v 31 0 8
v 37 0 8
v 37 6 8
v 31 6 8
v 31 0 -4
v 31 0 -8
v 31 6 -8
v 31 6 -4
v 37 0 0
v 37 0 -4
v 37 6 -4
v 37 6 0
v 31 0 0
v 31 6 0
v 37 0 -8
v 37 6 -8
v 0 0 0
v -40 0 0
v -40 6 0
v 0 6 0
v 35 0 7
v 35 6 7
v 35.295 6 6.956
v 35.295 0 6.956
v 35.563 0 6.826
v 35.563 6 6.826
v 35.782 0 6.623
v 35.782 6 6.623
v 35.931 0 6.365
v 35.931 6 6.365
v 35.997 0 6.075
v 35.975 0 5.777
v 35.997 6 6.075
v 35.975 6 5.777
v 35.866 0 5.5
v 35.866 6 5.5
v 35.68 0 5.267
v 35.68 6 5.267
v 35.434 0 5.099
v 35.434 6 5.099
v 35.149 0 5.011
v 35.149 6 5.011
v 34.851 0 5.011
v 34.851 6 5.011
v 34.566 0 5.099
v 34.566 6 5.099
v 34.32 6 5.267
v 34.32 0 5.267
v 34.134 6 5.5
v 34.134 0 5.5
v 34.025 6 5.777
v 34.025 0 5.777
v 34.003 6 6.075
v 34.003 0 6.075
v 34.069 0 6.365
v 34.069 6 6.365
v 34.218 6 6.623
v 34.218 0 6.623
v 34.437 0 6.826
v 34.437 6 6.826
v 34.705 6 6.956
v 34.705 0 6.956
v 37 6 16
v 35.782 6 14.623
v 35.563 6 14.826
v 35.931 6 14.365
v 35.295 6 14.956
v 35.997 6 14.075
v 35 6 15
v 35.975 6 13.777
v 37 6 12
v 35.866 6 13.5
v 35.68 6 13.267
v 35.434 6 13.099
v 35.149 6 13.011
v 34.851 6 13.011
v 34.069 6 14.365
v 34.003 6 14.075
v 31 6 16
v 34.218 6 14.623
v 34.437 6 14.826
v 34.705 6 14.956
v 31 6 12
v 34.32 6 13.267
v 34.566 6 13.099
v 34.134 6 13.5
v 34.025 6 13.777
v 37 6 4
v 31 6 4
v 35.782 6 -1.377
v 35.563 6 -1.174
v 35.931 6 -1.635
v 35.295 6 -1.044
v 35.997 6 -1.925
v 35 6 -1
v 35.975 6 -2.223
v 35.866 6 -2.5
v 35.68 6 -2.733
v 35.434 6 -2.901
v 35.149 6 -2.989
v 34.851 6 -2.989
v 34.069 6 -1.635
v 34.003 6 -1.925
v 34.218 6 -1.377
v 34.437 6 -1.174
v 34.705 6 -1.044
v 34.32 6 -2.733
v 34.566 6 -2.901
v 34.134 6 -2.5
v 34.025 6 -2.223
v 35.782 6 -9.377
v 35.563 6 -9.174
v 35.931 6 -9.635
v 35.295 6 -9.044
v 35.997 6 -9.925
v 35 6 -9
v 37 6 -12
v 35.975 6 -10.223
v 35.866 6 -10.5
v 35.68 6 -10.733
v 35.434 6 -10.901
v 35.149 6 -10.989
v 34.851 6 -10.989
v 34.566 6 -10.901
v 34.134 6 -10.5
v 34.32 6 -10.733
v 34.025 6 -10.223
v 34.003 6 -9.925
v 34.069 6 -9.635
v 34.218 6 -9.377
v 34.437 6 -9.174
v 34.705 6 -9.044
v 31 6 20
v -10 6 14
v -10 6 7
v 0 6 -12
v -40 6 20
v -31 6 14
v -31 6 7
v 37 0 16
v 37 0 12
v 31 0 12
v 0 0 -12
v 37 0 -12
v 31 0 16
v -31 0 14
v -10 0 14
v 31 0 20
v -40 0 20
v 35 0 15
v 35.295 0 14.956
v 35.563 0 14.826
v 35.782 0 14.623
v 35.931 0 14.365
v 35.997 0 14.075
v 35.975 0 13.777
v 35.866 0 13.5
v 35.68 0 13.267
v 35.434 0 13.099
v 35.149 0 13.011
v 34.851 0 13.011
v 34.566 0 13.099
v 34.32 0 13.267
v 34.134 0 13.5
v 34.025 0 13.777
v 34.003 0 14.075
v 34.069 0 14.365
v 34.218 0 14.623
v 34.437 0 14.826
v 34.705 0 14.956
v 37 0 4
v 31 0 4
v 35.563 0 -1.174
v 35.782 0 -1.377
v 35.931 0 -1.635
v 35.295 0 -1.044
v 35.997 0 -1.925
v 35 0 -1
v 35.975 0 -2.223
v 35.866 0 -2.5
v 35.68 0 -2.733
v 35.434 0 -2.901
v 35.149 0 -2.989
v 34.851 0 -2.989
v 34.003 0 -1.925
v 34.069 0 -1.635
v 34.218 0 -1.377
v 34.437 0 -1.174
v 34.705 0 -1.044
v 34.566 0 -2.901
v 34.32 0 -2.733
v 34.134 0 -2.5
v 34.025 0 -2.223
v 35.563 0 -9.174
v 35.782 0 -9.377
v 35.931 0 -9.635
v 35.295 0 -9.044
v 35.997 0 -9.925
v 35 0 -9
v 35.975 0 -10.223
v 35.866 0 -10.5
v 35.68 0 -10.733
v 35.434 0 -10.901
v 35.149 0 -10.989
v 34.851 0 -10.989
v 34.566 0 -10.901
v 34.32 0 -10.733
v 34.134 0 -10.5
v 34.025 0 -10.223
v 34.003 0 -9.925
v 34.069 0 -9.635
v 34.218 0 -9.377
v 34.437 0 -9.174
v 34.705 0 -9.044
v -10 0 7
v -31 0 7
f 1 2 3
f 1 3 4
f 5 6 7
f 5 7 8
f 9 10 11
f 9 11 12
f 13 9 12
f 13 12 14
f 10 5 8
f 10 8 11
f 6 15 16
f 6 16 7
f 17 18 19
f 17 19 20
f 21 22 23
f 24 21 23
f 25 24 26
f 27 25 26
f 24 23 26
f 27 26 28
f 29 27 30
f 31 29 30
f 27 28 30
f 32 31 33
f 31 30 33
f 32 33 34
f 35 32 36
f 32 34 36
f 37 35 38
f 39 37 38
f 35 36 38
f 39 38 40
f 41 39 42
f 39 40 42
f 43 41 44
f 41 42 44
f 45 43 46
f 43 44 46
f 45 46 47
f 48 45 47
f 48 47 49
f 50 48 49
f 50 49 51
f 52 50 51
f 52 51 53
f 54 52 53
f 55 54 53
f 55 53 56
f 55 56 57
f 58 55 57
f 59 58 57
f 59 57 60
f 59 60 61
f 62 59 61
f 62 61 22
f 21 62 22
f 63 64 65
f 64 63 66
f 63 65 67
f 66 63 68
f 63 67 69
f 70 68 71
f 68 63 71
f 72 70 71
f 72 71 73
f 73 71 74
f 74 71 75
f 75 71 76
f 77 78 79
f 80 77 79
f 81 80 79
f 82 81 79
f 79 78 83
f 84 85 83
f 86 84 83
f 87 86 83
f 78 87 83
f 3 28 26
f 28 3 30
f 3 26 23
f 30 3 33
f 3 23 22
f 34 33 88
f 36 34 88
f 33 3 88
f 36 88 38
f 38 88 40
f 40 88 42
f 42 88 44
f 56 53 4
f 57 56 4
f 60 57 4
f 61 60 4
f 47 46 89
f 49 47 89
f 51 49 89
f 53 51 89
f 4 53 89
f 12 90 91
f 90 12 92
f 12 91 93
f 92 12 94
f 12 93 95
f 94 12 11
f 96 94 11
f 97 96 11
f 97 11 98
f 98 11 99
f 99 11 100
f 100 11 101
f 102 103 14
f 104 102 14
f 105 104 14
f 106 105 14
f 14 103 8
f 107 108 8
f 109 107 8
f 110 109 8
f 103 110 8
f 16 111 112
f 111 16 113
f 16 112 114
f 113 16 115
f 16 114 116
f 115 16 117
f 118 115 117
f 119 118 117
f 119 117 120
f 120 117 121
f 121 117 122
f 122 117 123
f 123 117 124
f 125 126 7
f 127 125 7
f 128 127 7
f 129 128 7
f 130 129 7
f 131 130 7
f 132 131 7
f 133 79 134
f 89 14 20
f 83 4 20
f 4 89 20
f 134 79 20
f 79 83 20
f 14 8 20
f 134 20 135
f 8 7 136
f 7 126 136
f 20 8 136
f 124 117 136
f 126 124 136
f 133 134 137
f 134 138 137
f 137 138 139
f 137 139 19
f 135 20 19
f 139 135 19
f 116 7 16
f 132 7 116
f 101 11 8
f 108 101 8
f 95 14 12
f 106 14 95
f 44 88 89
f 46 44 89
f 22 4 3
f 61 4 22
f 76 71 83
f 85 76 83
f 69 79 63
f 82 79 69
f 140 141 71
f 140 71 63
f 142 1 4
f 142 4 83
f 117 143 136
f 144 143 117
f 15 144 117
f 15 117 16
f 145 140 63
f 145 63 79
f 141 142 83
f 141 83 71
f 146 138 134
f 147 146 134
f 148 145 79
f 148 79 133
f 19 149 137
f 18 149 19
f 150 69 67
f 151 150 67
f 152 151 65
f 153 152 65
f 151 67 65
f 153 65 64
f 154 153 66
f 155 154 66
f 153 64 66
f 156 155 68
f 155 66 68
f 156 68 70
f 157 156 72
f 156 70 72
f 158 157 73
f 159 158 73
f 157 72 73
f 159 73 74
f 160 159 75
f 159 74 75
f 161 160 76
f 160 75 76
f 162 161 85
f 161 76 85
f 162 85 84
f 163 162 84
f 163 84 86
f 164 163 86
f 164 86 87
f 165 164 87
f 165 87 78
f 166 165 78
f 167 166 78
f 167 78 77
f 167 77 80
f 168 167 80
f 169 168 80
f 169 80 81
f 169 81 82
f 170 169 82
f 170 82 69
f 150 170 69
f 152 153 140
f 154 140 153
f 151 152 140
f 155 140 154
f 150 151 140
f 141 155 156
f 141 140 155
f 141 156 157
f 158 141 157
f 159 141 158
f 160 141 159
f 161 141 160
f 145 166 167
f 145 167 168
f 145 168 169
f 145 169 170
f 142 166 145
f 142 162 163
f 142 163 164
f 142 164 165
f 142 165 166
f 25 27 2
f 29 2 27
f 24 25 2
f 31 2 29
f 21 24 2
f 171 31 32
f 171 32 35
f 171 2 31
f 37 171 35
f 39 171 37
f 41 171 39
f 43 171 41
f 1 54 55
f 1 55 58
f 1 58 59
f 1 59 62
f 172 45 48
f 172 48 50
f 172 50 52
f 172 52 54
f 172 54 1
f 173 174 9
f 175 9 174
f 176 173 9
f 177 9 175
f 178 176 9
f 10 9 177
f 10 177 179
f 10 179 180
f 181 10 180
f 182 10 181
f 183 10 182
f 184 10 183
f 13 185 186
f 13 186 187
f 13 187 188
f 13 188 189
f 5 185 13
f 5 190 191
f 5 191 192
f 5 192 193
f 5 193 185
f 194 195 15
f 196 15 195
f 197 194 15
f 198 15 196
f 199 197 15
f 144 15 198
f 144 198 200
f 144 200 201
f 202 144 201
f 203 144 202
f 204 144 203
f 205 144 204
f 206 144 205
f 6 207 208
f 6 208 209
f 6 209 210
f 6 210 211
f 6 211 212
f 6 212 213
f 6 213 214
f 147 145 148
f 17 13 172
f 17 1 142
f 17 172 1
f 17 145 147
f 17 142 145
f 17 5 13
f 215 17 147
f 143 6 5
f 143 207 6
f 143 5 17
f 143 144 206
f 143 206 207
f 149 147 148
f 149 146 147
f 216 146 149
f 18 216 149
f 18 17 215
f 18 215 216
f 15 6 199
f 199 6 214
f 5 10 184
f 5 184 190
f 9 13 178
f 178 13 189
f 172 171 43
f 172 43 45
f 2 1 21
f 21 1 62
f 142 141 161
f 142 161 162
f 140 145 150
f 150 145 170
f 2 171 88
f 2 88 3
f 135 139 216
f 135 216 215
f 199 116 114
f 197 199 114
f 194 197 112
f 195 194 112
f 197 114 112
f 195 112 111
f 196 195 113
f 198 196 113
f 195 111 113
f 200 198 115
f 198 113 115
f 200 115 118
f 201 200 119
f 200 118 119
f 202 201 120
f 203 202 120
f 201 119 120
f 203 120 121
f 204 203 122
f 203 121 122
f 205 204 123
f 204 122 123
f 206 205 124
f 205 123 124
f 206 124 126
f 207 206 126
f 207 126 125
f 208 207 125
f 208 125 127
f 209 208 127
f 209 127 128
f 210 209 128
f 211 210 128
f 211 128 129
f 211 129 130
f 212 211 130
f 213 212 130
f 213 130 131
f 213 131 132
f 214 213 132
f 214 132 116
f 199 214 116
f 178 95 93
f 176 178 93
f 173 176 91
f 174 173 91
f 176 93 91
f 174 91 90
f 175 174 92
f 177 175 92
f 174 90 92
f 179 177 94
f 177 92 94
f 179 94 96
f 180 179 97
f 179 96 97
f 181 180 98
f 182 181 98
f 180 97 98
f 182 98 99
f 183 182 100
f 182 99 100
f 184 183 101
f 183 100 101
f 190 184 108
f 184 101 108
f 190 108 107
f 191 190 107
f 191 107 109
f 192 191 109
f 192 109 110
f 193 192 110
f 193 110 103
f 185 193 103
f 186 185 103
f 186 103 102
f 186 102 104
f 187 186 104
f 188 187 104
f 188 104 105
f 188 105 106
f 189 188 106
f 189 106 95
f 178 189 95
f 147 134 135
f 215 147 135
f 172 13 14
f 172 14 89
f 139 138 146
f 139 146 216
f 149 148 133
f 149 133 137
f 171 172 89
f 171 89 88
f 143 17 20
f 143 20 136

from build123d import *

# Parameters (mm, degrees)
BOSS_EXTRUDE1_DEPTH = 6
SKETCH2_W           = 21
SKETCH2_H           = 7
CUT_EXTRUDE1_DEPTH  = 46.122056691
SKETCH3_R           = 1
CUT_EXTRUDE2_DEPTH  = 46.122056691


with BuildPart() as part:
    # Sketch1 → Boss-Extrude1 (new body)
    with BuildSketch(Plane(origin=(0, 0, 0), x_dir=(1, 0, 0), z_dir=(0, 1, 0))):
        Polygon((-40, 0), (0, 0), (0, 12), (37, 12), (37, 8), (31, 8), (31, 4), (37, 4), (37, 0), (31, 0), (31, -4), (37, -4), (37, -8), (31, -8), (31, -12), (37, -12), (37, -16), (31, -16), (31, -20), (-40, -20), align=None)
    extrude(amount=BOSS_EXTRUDE1_DEPTH)

    # Sketch2 → Cut-Extrude1 (cut, through all)
    with BuildSketch(Plane(origin=(0, 6, 0), x_dir=(1, 0, 0), z_dir=(0, 1, 0))):
        with Locations((-20.5, -10.5)):
            Rectangle(SKETCH2_W, SKETCH2_H)
    extrude(amount=-CUT_EXTRUDE1_DEPTH, mode=Mode.SUBTRACT)

    # Sketch3 → Cut-Extrude2 (cut, through all)
    with BuildSketch(Plane(origin=(0, 6, 0), x_dir=(1, 0, 0), z_dir=(0, 1, 0))):
        with Locations(Location((35, 10, 0), (0, 0, 270))):
            Circle(SKETCH3_R)
        with Locations(Location((35, 2, 0), (0, 0, 270))):
            Circle(SKETCH3_R)
        with Locations(Location((35, -6, 0), (0, 0, 270))):
            Circle(SKETCH3_R)
        with Locations(Location((35, -14, 0), (0, 0, 270))):
            Circle(SKETCH3_R)
    extrude(amount=-CUT_EXTRUDE2_DEPTH, mode=Mode.SUBTRACT)


solid = part.part
